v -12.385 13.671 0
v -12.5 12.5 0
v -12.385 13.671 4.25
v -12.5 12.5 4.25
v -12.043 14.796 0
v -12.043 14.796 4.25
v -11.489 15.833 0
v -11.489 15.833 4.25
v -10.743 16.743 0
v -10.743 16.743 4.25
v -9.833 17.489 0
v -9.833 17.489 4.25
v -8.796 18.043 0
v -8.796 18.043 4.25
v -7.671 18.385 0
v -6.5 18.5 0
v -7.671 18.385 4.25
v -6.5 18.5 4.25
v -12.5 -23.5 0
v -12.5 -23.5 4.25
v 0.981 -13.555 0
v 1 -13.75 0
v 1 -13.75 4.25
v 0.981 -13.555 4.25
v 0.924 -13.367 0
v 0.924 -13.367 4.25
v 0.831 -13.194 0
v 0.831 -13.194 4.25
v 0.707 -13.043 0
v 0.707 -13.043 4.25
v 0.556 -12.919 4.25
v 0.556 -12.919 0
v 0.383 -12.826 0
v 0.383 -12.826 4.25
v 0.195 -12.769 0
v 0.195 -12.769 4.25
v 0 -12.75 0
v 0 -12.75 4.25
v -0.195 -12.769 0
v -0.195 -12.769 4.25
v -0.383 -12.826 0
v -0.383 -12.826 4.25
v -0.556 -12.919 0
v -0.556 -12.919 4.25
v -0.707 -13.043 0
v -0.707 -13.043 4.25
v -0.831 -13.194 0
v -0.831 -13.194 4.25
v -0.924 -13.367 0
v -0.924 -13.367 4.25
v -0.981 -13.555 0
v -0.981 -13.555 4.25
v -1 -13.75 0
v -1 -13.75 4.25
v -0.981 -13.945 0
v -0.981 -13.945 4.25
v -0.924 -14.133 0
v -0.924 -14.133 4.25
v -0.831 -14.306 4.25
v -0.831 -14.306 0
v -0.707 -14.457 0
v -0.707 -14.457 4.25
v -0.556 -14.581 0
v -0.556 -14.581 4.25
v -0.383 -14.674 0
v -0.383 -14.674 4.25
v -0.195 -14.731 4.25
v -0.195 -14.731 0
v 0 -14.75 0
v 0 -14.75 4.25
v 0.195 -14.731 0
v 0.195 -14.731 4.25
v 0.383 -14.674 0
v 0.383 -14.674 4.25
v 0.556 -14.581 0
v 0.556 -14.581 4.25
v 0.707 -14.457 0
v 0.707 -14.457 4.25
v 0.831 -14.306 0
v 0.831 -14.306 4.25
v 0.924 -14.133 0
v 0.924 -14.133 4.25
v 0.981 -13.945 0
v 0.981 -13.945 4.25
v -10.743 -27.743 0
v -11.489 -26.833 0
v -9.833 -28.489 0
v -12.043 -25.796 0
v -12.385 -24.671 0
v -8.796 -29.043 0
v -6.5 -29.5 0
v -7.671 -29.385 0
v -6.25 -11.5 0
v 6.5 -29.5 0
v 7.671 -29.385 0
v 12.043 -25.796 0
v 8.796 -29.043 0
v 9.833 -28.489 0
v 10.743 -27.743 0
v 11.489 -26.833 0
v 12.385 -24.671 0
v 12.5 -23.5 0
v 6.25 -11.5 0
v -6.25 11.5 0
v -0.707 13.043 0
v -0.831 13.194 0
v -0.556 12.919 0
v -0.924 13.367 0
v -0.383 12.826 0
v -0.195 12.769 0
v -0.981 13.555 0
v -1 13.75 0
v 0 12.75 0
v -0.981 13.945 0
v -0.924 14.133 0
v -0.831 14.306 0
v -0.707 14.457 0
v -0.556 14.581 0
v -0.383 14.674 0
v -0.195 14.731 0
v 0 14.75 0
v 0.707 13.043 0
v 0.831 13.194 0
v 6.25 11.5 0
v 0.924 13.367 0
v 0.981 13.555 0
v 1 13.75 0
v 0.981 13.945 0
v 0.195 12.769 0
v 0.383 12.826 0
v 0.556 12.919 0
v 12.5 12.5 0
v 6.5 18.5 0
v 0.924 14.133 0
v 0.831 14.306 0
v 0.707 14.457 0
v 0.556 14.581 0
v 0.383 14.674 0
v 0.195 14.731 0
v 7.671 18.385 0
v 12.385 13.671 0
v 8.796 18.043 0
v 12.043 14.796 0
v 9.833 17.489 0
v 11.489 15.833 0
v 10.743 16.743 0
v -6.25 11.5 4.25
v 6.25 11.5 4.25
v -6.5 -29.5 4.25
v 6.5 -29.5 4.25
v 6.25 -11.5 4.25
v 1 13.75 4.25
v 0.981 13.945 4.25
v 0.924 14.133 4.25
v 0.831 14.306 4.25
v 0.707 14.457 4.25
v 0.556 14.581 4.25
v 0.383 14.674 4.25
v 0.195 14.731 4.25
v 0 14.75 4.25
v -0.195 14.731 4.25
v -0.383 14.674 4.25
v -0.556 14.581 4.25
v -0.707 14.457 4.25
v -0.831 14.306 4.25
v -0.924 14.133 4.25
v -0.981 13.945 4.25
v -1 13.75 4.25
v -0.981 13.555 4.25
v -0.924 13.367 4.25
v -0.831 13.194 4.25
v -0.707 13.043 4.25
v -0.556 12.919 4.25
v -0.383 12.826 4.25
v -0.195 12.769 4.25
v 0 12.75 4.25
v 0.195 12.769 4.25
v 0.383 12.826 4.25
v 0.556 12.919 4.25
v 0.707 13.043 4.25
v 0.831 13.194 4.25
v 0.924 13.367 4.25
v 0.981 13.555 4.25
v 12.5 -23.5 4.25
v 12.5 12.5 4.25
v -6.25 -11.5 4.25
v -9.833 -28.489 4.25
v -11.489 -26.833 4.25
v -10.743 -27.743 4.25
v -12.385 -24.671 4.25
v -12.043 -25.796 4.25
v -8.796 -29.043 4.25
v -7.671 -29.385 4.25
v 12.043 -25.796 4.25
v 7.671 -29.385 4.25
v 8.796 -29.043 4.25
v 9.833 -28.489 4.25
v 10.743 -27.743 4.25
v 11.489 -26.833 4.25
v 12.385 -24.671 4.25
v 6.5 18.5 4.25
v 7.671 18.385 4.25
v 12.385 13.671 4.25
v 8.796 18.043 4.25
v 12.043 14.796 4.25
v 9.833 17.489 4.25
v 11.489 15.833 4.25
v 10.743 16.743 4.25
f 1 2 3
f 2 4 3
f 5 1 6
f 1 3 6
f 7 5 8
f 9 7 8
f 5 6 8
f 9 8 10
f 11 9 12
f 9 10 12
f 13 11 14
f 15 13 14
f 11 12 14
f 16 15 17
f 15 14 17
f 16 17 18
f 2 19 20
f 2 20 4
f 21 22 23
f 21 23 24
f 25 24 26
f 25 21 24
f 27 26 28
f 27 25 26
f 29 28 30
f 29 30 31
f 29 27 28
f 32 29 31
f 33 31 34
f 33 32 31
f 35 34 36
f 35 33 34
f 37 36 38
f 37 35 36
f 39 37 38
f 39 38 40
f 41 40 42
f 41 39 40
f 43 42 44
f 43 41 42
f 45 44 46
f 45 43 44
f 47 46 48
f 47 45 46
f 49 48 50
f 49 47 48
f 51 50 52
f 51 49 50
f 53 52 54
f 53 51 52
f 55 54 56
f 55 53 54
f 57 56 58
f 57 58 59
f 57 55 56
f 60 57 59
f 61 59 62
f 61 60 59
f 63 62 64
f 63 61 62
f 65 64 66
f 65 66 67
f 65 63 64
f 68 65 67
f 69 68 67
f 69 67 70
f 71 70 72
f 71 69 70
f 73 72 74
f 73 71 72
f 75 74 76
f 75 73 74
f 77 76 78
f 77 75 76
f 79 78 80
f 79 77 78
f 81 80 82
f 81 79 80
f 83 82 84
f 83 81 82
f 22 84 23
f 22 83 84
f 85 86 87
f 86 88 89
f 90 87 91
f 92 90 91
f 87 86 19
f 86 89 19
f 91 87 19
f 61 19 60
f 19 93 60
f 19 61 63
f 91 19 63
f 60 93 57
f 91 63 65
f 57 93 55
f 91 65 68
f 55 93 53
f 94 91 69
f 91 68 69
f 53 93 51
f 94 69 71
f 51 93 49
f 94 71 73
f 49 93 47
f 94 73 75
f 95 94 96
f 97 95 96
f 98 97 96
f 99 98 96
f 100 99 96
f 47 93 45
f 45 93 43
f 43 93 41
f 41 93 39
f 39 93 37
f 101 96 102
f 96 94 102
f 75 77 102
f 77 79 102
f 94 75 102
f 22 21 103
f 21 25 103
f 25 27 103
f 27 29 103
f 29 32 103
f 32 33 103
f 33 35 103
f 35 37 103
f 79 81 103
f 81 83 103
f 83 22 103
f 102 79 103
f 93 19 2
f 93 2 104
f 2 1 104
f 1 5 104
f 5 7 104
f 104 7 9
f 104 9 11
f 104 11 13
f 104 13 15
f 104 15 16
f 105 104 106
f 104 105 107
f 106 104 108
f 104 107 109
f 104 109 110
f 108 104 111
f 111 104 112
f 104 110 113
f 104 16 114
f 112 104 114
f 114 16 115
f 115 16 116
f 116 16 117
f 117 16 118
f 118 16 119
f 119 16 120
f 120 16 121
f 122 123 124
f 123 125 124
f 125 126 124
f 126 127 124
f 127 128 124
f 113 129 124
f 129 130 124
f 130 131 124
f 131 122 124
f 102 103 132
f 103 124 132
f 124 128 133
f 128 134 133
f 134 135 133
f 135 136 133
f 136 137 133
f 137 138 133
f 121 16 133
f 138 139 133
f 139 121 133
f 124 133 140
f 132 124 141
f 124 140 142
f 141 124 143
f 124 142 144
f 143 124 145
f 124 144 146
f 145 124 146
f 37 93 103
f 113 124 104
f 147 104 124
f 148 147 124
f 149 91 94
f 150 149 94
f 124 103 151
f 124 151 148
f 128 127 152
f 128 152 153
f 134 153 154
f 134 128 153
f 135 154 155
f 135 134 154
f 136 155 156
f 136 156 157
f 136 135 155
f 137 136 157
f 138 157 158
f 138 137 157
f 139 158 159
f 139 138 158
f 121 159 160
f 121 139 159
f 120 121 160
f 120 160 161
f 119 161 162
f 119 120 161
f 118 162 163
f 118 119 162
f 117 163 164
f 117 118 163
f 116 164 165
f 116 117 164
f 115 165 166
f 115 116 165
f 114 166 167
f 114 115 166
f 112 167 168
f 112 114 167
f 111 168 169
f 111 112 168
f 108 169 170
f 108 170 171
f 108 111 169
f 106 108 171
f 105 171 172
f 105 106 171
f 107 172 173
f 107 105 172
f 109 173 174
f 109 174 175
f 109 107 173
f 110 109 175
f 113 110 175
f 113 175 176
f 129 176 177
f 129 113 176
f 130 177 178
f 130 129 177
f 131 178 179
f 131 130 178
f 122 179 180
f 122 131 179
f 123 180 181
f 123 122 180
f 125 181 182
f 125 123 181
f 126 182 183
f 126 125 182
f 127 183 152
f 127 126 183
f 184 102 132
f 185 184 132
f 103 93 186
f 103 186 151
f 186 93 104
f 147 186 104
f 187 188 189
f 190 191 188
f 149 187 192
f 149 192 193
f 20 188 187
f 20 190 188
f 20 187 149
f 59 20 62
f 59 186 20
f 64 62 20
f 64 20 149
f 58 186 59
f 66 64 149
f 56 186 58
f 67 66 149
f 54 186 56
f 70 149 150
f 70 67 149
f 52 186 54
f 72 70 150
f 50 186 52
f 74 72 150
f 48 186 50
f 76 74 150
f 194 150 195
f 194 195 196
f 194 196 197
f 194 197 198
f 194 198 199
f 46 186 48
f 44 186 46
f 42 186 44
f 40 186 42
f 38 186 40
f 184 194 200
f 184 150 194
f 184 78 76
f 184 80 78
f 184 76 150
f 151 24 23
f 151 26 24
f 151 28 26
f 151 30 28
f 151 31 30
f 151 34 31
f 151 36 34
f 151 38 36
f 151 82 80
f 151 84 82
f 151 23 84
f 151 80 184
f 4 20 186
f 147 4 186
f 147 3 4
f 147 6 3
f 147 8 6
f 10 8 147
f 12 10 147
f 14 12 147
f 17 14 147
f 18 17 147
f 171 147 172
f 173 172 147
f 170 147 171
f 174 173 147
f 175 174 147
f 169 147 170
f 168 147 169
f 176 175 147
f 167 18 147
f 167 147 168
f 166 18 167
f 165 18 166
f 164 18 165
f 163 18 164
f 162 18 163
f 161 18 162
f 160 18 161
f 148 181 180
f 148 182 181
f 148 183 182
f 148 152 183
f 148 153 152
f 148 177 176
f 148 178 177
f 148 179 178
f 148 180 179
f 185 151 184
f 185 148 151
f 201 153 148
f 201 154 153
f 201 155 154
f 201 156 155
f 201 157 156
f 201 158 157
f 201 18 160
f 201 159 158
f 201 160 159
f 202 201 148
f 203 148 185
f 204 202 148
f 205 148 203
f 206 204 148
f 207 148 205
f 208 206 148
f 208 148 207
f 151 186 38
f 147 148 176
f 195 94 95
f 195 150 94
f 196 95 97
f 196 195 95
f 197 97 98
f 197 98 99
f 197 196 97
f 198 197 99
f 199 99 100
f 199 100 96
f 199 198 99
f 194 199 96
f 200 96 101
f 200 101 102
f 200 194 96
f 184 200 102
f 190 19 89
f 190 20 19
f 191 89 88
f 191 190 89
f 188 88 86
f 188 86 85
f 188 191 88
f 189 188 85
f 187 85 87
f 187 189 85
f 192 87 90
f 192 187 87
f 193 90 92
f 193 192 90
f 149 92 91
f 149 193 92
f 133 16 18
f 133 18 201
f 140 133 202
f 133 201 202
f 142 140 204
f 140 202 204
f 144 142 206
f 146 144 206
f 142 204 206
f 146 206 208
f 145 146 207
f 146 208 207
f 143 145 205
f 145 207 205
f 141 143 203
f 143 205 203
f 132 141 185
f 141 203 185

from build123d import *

# Parameters (mm, degrees)
F0_W     = 25
F0_H     = 48
F0_R     = 1
F0_W_2   = 12.5
F0_H_2   = 23
F1_DEPTH = 4.25
F2_R     = 6


with BuildPart() as f1:
    # F0 (on Top) → F1 (new body)
    with BuildSketch(Plane.XY):
        with Locations((0, -5.5)):
            Rectangle(F0_W, F0_H)
        with Locations((0, -13.75)):
            Circle(F0_R, mode=Mode.SUBTRACT)
        Rectangle(F0_W_2, F0_H_2, mode=Mode.SUBTRACT)
        with Locations((0, 13.75)):
            Circle(F0_R, mode=Mode.SUBTRACT)
    extrude(amount=F1_DEPTH)

    # F2
    f2_edges = [f1.edges().sort_by_distance(p)[0] for p in [
        (-12.5, 18.5, 2.125),
        (12.5, 18.5, 2.125),
        (12.5, -29.5, 2.125),
        (-12.5, -29.5, 2.125),
    ]]
    fillet(f2_edges, radius=F2_R)


solid = f1.part
